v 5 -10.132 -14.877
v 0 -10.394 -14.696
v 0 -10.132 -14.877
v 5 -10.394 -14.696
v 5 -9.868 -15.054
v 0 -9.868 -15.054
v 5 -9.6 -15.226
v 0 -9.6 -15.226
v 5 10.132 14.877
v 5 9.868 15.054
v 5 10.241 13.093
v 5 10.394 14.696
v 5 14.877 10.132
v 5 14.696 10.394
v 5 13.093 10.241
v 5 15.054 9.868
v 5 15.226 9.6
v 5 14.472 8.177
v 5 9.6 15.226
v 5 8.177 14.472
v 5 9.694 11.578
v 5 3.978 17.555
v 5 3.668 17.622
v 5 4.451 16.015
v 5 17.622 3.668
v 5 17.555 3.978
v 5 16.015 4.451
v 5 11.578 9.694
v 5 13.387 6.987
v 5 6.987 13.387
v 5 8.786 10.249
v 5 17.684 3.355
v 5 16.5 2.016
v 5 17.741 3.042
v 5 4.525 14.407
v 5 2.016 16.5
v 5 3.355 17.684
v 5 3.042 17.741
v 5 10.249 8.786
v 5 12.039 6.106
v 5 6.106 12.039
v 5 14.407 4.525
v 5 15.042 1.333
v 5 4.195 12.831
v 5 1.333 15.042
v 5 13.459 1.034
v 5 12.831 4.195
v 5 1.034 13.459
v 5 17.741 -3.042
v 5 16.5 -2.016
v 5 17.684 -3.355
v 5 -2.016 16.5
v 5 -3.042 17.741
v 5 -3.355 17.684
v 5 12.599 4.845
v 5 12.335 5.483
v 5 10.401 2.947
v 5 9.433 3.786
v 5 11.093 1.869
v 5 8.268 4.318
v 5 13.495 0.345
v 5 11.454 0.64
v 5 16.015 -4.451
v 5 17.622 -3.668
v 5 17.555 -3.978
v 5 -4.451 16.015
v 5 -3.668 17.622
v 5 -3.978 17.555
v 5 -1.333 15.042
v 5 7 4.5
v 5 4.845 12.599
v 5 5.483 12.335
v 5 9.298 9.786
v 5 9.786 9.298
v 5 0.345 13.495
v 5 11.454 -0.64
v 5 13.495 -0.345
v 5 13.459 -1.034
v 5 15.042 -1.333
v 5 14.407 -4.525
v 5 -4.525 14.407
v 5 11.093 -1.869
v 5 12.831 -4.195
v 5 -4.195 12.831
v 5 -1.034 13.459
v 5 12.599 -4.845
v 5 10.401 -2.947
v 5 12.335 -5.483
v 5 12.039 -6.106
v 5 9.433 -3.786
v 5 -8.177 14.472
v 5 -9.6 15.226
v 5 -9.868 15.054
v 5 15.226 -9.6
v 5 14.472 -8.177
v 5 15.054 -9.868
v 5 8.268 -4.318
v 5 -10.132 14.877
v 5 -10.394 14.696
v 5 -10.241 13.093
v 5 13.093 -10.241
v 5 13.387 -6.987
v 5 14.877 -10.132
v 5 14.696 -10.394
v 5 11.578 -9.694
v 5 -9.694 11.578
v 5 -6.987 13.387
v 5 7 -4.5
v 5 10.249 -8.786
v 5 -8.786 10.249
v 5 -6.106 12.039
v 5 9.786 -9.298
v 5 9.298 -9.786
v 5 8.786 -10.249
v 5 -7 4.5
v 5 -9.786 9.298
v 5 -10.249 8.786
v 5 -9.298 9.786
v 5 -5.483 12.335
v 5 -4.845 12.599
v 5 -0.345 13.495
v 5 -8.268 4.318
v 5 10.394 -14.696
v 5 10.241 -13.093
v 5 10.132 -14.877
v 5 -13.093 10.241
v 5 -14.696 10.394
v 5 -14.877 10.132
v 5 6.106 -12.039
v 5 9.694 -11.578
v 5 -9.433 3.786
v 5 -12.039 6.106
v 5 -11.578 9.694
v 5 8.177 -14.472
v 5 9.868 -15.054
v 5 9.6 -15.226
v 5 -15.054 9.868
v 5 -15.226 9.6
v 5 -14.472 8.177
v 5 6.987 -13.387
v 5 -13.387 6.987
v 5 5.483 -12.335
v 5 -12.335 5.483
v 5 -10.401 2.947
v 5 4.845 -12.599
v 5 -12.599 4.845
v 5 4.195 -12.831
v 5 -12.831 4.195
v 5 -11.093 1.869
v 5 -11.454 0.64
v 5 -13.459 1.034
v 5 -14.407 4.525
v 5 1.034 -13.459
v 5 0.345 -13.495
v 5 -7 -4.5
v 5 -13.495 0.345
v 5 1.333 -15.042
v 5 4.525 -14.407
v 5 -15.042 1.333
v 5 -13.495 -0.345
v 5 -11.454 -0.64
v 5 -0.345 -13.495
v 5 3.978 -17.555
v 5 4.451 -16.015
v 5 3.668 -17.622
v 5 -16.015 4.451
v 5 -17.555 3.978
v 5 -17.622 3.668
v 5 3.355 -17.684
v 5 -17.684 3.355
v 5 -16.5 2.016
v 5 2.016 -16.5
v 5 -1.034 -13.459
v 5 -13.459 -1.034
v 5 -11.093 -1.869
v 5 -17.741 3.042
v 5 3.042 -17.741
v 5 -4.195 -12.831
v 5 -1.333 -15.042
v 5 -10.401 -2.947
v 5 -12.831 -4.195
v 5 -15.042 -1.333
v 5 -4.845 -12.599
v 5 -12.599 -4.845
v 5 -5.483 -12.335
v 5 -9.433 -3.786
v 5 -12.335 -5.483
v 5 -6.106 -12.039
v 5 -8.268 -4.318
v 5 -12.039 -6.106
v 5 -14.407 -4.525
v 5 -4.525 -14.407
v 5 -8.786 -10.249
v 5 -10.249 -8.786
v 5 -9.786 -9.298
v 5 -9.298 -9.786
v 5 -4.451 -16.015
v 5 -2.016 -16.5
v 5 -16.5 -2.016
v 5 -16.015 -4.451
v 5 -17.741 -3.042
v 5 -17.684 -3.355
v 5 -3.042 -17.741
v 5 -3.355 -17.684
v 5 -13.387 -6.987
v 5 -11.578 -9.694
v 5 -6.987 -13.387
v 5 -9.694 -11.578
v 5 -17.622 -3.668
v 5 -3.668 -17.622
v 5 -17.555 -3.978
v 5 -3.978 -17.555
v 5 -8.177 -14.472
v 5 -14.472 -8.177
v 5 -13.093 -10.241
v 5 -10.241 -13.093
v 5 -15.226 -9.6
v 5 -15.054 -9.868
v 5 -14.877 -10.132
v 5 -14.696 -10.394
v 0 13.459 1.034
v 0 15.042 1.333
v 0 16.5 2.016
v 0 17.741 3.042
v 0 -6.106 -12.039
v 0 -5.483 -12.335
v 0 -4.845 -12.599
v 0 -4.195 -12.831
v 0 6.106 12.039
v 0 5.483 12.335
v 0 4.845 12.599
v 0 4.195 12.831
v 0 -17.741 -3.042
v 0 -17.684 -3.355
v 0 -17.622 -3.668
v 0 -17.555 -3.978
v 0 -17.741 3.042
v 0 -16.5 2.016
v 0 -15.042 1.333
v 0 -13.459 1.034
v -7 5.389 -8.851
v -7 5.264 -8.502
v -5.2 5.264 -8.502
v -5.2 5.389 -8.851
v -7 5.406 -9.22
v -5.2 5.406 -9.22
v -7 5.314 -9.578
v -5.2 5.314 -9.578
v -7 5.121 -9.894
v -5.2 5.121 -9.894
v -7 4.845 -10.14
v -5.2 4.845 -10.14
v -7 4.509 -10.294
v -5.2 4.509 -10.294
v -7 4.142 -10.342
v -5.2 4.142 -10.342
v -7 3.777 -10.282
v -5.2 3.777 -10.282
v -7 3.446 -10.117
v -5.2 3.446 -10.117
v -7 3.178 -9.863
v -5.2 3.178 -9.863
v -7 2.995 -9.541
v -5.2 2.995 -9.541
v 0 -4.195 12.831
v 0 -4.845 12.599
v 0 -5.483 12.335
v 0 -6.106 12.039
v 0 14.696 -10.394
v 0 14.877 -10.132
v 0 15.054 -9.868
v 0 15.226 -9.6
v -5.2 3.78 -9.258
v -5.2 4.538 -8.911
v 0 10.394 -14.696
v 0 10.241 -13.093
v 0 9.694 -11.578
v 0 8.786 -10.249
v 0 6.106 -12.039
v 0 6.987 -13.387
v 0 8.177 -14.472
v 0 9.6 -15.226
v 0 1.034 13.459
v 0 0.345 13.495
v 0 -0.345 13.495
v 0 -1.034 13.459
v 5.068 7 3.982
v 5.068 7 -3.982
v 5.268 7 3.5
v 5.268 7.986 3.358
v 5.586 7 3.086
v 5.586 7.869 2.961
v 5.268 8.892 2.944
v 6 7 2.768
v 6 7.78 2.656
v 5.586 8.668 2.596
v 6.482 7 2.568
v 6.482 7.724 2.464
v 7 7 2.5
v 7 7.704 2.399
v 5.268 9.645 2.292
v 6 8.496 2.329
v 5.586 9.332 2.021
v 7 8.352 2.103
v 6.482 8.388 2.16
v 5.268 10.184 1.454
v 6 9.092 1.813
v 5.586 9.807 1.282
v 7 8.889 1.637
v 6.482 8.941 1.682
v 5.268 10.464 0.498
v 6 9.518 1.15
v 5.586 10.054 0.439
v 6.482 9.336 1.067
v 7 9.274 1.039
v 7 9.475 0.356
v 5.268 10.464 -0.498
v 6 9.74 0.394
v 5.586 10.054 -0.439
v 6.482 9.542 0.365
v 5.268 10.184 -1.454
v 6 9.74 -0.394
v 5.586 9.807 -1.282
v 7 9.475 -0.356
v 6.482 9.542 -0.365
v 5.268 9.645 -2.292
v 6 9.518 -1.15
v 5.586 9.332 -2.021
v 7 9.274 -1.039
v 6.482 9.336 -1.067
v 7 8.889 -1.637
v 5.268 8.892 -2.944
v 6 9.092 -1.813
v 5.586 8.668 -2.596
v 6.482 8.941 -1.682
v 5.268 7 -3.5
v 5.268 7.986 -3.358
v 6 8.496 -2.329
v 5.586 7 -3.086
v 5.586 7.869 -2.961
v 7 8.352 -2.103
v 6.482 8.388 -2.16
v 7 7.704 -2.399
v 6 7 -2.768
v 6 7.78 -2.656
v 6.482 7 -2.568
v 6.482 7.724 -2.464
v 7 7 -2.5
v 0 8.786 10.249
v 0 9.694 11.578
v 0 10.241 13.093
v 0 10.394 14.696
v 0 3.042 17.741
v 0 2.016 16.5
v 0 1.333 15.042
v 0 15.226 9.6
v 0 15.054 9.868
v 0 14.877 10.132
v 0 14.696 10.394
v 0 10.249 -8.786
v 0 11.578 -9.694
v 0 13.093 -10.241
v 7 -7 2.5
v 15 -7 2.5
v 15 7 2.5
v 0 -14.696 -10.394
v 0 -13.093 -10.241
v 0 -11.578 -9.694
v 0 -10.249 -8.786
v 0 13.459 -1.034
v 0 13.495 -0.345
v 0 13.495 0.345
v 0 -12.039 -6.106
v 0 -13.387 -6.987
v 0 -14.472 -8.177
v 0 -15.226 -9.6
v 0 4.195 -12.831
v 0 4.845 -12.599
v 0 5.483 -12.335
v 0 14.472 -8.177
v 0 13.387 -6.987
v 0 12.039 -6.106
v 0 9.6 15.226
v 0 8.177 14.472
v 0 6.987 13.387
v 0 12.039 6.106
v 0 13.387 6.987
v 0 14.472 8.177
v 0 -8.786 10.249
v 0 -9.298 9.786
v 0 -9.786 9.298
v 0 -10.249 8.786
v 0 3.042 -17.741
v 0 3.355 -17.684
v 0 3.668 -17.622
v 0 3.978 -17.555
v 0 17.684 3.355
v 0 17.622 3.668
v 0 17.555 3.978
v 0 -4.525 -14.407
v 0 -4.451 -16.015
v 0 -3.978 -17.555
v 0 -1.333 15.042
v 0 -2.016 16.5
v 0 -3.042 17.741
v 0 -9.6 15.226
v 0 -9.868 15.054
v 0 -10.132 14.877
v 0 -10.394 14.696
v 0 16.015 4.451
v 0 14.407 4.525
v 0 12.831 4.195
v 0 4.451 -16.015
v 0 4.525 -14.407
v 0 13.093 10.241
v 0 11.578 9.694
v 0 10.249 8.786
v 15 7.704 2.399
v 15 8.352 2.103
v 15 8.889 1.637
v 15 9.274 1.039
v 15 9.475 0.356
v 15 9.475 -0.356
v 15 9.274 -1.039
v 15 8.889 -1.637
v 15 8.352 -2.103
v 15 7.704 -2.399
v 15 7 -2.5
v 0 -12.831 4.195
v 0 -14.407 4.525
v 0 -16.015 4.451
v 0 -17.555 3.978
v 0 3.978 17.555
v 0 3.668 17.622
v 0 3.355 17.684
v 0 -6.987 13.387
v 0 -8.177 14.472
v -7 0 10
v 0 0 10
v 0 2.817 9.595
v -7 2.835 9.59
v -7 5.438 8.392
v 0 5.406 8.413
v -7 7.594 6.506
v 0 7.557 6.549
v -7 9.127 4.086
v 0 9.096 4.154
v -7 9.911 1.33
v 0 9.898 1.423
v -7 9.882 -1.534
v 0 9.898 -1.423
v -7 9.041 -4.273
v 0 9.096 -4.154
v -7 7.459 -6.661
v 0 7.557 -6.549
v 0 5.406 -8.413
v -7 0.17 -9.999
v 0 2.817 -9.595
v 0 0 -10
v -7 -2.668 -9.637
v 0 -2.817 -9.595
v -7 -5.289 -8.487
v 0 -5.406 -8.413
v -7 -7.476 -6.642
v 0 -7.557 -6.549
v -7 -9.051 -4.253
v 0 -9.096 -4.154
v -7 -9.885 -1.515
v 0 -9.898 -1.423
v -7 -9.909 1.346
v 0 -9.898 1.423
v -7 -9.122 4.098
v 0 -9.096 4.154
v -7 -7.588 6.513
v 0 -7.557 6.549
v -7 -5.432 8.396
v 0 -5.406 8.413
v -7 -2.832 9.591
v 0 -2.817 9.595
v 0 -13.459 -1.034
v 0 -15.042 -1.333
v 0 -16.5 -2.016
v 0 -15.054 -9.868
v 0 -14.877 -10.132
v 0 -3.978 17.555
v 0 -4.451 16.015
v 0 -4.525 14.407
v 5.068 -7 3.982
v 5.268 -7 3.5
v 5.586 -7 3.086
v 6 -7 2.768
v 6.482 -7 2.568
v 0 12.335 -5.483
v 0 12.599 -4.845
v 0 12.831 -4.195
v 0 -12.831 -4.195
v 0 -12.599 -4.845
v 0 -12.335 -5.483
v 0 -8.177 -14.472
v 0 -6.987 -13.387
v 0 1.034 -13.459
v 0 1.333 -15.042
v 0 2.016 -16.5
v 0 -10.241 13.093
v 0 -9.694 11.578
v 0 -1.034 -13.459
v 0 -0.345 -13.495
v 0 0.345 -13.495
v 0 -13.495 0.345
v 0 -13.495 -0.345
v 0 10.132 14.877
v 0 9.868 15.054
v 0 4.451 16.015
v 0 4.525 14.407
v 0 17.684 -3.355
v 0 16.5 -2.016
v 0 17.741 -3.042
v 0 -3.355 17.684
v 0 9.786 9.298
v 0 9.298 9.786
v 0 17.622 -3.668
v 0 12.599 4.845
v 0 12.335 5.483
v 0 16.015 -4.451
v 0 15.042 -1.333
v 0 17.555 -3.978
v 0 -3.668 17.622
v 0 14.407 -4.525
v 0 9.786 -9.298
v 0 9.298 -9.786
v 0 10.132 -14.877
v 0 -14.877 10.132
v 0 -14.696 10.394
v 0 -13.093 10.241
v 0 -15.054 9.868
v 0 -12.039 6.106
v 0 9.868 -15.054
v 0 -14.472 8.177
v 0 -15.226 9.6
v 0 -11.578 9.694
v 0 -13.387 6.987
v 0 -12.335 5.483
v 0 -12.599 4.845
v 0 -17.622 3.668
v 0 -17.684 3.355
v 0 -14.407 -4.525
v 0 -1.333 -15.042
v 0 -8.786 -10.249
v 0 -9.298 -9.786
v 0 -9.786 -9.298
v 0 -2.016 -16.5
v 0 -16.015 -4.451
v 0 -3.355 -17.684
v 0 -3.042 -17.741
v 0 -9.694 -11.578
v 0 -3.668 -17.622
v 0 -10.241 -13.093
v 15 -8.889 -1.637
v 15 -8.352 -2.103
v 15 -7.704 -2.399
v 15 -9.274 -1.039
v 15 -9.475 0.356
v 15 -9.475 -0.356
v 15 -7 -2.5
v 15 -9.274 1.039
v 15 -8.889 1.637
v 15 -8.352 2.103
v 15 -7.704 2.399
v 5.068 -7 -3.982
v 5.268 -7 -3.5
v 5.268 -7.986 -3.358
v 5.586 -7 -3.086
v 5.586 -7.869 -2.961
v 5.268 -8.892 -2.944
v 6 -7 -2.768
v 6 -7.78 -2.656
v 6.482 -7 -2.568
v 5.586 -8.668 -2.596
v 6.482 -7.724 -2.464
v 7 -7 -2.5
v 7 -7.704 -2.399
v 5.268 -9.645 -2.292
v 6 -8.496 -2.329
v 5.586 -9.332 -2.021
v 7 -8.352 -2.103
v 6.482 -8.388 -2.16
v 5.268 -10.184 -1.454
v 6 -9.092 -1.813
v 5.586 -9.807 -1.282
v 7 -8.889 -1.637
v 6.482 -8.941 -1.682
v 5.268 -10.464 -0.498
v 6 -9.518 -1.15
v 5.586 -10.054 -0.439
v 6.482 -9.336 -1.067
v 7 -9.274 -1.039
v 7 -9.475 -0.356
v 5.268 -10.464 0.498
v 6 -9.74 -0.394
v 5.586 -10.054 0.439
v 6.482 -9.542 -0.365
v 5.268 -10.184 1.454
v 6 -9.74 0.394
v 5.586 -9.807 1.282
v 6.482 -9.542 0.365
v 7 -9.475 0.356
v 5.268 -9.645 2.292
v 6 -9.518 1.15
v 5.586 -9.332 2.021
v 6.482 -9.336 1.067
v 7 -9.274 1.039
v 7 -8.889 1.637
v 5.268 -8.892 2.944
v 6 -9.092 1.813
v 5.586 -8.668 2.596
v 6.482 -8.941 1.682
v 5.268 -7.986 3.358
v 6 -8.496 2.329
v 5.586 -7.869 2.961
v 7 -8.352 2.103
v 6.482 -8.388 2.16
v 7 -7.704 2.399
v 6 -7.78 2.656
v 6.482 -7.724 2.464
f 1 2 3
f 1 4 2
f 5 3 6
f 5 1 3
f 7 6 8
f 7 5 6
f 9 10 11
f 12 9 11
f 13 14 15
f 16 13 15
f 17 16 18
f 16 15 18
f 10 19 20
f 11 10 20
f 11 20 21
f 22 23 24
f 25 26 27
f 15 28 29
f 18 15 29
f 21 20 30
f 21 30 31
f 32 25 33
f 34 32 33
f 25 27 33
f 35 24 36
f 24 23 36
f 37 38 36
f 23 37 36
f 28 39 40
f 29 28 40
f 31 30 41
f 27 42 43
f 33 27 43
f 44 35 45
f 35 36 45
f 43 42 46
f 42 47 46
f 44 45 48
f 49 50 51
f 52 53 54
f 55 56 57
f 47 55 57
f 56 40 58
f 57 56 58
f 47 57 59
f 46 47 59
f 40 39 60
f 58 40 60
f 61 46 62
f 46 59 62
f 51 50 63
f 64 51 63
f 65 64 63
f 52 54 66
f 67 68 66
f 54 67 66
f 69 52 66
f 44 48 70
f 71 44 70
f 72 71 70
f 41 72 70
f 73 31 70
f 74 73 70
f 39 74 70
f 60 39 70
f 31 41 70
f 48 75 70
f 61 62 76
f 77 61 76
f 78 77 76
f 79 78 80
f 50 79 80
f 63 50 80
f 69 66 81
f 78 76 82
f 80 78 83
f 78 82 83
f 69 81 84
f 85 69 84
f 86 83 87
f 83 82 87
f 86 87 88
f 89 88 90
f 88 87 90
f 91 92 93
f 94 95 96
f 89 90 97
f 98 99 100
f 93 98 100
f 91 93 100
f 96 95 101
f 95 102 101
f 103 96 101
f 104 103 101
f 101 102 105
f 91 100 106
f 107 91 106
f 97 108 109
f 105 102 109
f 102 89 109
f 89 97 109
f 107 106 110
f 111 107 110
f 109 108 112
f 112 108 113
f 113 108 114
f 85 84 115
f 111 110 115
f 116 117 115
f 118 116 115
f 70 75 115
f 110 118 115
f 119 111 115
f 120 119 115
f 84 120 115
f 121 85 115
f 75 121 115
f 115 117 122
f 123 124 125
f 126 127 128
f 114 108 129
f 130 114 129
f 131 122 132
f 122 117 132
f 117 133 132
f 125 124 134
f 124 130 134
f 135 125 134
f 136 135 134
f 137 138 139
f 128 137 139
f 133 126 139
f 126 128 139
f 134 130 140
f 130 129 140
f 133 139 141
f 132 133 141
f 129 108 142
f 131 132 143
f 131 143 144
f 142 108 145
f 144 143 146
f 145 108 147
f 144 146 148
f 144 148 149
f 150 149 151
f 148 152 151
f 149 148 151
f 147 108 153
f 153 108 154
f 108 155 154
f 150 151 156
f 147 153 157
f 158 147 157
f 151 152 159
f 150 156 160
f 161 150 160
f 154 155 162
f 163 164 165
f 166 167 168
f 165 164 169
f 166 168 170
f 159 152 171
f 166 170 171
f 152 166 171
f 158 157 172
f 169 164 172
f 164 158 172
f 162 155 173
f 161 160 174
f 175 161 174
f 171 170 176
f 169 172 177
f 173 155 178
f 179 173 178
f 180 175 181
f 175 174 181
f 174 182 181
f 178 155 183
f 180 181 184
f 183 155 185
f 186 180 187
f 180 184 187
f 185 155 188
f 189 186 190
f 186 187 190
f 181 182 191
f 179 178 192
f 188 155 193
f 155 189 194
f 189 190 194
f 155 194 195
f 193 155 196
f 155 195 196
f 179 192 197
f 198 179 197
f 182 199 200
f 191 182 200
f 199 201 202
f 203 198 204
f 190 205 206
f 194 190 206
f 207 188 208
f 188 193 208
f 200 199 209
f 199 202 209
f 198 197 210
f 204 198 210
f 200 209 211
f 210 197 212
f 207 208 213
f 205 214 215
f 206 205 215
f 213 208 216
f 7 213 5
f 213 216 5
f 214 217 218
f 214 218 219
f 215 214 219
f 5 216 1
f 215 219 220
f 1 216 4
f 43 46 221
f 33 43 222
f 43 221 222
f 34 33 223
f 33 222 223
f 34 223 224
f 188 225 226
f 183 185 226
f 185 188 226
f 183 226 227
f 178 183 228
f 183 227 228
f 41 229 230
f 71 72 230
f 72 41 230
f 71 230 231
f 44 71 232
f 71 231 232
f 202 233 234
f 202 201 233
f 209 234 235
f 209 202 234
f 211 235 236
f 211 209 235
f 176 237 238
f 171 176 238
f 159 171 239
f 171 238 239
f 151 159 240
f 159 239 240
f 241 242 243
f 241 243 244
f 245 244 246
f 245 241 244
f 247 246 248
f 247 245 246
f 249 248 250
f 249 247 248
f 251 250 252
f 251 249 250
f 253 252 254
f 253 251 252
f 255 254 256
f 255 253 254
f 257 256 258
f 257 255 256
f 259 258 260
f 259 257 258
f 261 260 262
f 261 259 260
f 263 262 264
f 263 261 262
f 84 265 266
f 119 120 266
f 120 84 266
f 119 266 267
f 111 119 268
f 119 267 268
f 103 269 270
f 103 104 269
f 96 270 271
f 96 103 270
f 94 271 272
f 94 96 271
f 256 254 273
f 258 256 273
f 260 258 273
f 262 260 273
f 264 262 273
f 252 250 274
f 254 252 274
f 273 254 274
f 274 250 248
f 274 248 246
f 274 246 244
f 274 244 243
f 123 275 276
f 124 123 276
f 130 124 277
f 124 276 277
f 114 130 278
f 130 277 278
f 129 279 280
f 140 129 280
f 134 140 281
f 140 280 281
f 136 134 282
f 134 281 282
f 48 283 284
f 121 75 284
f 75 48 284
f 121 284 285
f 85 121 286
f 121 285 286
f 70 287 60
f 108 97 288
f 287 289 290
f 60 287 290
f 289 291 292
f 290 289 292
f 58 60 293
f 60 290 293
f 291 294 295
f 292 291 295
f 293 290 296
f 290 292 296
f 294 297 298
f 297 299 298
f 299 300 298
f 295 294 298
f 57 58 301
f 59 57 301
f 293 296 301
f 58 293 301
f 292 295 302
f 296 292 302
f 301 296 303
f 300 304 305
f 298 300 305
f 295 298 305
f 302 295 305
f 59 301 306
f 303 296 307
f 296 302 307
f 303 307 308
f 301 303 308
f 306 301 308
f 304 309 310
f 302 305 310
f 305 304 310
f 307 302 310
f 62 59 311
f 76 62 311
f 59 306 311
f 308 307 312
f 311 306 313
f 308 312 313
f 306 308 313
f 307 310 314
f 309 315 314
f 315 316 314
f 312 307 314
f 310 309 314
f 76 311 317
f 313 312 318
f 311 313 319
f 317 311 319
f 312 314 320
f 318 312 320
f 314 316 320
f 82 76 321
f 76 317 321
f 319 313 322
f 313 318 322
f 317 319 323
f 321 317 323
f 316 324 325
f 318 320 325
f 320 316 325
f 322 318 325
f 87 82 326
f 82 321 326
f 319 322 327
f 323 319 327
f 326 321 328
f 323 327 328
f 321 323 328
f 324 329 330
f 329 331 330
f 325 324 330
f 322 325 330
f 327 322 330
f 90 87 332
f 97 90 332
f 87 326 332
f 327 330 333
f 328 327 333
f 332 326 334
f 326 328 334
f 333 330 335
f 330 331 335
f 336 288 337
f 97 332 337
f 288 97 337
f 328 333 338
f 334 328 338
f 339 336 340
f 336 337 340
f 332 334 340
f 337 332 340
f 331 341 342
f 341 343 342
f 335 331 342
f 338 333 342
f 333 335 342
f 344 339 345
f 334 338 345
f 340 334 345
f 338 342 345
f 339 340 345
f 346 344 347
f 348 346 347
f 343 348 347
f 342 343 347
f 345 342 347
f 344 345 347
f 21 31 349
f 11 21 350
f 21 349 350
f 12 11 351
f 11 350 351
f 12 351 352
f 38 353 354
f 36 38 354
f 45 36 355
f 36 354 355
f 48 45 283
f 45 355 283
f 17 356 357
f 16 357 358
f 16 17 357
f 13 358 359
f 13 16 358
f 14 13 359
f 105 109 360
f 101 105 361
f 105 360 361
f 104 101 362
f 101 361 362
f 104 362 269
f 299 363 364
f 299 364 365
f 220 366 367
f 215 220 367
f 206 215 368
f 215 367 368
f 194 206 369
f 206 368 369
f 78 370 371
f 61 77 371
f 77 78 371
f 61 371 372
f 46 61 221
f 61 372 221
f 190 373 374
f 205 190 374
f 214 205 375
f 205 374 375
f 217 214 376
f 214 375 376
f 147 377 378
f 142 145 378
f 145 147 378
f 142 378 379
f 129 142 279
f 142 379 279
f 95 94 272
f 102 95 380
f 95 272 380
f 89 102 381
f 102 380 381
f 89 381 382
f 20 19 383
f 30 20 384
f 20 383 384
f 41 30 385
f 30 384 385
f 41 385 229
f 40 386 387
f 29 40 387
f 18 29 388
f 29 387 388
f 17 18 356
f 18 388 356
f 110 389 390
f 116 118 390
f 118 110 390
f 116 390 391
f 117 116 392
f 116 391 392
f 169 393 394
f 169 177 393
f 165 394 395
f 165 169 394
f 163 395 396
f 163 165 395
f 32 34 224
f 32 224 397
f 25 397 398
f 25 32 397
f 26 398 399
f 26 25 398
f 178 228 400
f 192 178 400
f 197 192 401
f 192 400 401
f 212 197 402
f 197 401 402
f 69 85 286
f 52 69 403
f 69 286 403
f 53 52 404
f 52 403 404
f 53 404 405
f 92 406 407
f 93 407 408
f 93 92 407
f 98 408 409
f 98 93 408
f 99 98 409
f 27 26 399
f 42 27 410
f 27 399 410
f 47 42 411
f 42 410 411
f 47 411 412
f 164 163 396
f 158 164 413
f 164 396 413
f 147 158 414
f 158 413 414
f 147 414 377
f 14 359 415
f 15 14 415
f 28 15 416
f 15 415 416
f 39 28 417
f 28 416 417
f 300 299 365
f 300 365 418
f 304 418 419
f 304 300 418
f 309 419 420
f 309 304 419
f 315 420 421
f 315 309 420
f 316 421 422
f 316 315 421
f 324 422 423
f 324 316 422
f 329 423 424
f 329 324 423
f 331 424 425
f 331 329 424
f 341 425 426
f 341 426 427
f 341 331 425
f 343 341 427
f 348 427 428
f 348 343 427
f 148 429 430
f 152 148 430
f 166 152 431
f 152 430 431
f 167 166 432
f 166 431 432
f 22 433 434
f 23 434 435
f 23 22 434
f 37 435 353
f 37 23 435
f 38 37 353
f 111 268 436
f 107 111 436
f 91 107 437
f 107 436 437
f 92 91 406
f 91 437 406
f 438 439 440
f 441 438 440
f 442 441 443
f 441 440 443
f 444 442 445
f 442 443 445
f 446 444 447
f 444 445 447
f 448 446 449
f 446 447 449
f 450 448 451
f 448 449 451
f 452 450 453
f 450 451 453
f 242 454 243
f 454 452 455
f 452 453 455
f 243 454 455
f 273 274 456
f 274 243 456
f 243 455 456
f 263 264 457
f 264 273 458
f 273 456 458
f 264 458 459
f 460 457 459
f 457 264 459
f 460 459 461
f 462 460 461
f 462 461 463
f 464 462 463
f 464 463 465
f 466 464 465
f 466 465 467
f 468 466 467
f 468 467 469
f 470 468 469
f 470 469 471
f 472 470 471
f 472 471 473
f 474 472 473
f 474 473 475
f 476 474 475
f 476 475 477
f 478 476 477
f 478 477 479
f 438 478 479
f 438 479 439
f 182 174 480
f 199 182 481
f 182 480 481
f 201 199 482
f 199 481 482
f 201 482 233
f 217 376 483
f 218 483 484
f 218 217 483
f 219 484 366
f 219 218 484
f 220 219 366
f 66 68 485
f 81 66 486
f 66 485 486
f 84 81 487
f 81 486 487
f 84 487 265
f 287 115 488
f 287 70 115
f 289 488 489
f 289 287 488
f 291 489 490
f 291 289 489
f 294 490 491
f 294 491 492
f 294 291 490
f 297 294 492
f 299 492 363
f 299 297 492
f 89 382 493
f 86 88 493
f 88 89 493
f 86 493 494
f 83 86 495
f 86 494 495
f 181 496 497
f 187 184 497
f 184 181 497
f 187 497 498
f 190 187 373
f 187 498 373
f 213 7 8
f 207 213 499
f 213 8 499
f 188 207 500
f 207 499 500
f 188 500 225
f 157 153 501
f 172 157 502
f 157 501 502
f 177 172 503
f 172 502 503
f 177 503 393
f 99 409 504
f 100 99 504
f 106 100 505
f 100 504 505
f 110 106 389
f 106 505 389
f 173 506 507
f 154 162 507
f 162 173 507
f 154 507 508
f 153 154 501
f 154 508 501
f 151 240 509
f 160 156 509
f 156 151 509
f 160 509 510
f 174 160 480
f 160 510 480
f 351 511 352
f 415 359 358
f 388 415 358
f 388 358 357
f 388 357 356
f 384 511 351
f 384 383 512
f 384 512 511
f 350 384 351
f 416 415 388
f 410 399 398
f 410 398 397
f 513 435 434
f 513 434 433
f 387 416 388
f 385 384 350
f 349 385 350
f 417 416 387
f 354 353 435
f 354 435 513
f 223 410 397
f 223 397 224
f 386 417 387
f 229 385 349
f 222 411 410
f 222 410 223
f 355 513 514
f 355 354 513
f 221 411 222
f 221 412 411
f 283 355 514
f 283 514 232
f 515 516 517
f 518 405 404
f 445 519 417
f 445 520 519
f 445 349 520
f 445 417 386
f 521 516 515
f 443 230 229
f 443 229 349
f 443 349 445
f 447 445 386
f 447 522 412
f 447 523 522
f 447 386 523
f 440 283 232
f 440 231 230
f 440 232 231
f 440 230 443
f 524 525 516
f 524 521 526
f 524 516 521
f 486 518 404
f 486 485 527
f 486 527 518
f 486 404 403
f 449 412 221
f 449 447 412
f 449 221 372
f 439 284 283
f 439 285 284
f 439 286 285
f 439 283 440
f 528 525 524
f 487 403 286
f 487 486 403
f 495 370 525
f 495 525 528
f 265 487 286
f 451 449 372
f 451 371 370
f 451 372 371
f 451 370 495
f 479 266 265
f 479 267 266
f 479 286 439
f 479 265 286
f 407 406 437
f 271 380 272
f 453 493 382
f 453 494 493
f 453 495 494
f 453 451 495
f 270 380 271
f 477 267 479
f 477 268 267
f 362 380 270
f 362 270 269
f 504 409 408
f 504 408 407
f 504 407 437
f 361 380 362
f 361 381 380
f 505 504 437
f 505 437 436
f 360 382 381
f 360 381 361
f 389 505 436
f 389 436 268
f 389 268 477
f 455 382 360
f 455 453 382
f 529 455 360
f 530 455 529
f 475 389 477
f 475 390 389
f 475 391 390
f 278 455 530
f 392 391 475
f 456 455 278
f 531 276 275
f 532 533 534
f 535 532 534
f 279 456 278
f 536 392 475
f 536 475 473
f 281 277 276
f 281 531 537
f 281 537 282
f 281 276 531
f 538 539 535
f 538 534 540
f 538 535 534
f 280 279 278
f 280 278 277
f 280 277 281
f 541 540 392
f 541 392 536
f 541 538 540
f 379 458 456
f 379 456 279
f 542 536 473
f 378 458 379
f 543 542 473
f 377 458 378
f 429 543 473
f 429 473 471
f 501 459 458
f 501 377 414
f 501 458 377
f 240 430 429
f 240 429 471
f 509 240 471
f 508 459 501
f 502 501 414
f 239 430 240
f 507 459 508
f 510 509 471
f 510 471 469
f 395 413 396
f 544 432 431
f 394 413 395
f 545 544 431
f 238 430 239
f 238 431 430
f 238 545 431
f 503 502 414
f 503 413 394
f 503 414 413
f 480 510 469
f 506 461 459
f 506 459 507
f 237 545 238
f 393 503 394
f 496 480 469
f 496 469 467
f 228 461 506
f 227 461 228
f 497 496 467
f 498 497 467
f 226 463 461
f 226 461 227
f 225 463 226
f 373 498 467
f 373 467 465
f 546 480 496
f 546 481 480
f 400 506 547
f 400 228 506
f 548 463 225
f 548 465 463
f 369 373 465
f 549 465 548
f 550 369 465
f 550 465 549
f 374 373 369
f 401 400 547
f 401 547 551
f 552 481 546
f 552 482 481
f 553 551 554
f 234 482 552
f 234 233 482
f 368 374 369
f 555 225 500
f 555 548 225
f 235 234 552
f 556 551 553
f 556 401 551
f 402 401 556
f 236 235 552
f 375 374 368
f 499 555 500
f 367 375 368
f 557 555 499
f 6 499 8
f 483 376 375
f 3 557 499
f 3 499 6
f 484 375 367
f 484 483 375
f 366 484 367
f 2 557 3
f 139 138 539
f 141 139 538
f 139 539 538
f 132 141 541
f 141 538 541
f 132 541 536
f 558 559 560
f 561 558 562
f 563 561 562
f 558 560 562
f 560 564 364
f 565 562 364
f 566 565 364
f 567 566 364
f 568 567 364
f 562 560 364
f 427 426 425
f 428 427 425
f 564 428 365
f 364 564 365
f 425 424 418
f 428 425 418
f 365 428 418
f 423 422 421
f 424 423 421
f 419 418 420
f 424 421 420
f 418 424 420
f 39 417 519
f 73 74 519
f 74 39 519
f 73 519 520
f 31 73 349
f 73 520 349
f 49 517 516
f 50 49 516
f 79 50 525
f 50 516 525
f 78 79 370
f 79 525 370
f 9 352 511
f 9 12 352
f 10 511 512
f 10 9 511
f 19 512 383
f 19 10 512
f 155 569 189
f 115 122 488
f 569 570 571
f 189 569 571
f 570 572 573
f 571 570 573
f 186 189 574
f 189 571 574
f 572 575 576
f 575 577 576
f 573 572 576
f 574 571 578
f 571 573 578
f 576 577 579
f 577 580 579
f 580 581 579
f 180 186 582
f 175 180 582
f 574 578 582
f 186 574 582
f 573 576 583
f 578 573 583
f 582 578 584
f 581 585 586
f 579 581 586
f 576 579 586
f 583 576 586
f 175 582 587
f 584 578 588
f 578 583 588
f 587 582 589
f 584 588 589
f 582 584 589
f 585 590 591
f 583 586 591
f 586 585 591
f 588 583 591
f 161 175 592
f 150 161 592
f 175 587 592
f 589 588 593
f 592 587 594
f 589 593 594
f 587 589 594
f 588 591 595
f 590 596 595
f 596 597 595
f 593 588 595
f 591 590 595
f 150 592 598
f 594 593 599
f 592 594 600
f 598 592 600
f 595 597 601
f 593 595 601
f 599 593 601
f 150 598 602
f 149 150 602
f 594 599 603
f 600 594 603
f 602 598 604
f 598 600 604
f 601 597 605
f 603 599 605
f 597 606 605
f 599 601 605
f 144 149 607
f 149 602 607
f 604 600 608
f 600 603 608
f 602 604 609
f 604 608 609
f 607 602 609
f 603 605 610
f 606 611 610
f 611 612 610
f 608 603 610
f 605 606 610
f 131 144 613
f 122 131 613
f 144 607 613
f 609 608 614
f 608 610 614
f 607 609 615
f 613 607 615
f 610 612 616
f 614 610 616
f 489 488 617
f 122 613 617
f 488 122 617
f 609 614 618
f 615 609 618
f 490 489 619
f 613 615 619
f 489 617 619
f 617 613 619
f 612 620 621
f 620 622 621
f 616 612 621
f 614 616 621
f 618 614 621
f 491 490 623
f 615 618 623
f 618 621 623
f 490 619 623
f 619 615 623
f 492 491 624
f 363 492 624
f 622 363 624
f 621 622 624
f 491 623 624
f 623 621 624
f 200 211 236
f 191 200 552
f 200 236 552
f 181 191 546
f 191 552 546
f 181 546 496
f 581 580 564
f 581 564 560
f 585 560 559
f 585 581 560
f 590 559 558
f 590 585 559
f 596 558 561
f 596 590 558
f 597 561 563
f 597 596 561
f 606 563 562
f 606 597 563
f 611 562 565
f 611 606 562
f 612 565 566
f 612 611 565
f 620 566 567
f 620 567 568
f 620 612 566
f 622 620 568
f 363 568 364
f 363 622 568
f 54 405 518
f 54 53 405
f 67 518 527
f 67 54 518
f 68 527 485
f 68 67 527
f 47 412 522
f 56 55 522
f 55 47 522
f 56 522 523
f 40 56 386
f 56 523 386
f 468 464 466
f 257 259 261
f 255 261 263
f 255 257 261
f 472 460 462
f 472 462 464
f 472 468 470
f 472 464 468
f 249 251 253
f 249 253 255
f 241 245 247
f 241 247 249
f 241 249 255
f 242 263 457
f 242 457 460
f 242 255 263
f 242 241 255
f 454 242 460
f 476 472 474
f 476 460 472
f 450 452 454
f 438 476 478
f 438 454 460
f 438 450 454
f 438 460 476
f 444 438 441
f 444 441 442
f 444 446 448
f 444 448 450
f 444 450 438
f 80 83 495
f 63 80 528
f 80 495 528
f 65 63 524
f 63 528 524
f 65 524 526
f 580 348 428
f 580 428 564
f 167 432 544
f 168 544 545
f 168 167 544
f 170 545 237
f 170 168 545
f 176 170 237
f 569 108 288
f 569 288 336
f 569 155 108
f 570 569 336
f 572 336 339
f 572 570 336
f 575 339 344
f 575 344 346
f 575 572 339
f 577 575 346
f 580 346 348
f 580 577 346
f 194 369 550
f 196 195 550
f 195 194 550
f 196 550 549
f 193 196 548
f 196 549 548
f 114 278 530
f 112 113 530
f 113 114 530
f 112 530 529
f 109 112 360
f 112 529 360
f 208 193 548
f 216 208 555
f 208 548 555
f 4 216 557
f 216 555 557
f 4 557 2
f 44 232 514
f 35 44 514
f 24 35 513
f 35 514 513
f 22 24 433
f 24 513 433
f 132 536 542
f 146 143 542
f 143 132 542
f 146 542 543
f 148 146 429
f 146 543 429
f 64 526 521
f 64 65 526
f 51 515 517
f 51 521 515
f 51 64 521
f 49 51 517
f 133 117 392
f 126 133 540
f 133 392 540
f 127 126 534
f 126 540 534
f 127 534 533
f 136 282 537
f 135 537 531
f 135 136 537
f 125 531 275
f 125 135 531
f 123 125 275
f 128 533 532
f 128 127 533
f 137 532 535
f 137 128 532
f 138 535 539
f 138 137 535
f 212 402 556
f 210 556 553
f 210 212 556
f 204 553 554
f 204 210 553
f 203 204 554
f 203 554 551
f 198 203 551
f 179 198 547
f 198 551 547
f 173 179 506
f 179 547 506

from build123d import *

# Parameters (mm, degrees)
BASPROSKE_W              = 5
BASPROSKE_H              = 18
TOOTHCUT_DEPTH           = 26.942243542
TEETHCUTS_COUNT          = 16
TEETHCUTS_ANGLE          = 337.5
BORSKE_R                 = 2.5
BORE_DEPTH               = 50.0000508
BOSS_EXTRUDE1_DEPTH      = 7
BOSS_EXTRUDE1_DEPTH_BACK = 5
SKETCH1_R                = 10
SKETCH2_R                = 1.25
BOSS_EXTRUDE3_DEPTH      = 1.8
BOSS_EXTRUDE4_DEPTH      = 10
FILLET1_R                = 2


with BuildPart() as part:
    # BasProSke → Base-Revolve (revolve)
    with BuildSketch(Plane(origin=(0, 0, 0), x_dir=(1, 0, 0), z_dir=(0, 1, 0)), mode=Mode.PRIVATE) as base_revolve_sk:
        with Locations((2.5, 9)):
            Rectangle(BASPROSKE_W, BASPROSKE_H)
    revolve(base_revolve_sk.sketch.rotate(Axis((-10, 0, 0), (1, 0, 0)), 180), axis=Axis((-10, 0, 0), (1, 0, 0)))

    # TooCutSke → ToothCut (cut, through all)
    with BuildSketch(Plane(origin=(0, 0, 0), x_dir=(0, 0, -1), z_dir=(1, 0, 0))):
        with BuildLine():
            ThreePointArc((1.03434411, 13.459313997), (0, 13.499), (-1.03434411, 13.459313997))
            ThreePointArc((-1.03434411, 13.459313997), (-1.635143665, 15.806872195), (-3.065655864, 17.762792553))
            ThreePointArc((-3.065655864, 17.762792553), (0, 18.0254), (3.065655864, 17.762792553))
            ThreePointArc((3.065655864, 17.762792553), (1.635143665, 15.806872195), (1.03434411, 13.459313997))
        make_face()
    toothcut = extrude(amount=TOOTHCUT_DEPTH, mode=Mode.SUBTRACT)

    # TeethCuts: ToothCut ×16 about axis
    teethcuts_axis = Axis((-10, 0, 0), (1, 0, 0))
    for i in range(1, TEETHCUTS_COUNT):
        add(toothcut.rotate(teethcuts_axis, i * TEETHCUTS_ANGLE / (TEETHCUTS_COUNT - 1)), mode=Mode.SUBTRACT)

    # BorSke → Bore (cut, symmetric)
    with BuildSketch(Plane(origin=(0, 0, 0), x_dir=(0, 0, -1), z_dir=(1, 0, 0))):
        with Locations(Location((0, 0, 0), (0, 0, 180))):
            Circle(BORSKE_R)
    extrude(amount=BORE_DEPTH, both=True, mode=Mode.SUBTRACT)

    # Sketch1 → Boss-Extrude1 (add, two sides: drawn at the far end of the back side and taken through both)
    with BuildSketch(Plane.ZY.offset(-BOSS_EXTRUDE1_DEPTH_BACK)):
        Circle(SKETCH1_R)
    extrude(amount=BOSS_EXTRUDE1_DEPTH + BOSS_EXTRUDE1_DEPTH_BACK)

    # Sketch2 → Boss-Extrude3 (add)
    with BuildSketch(Plane.ZY.offset(7)):
        with Locations((-9.092660354, 4.162154213)):
            Circle(SKETCH2_R)
    extrude(amount=-BOSS_EXTRUDE3_DEPTH)

    # Sketch3 → Boss-Extrude4 (add)
    with BuildSketch(Plane(origin=(5, 0, 0), x_dir=(0, 0, -1), z_dir=(1, 0, 0))):
        with BuildLine():
            Line((2.5, 7), (2.5, -7))
            ThreePointArc((2.5, -7), (0, -9.5), (-2.5, -7))
            Line((-2.5, -7), (-2.5, 7))
            ThreePointArc((-2.5, 7), (0, 9.5), (2.5, 7))
        make_face()
    extrude(amount=BOSS_EXTRUDE4_DEPTH)

    # Fillet1
    fillet1_edges = [part.edges().sort_by_distance(p)[0] for p in [
        (5, 9.5, 0),
        (5, 0, 2.5),
        (5, -9.5, 0),
        (5, 0, -2.5),
    ]]
    fillet(fillet1_edges, radius=FILLET1_R)


solid = part.part
